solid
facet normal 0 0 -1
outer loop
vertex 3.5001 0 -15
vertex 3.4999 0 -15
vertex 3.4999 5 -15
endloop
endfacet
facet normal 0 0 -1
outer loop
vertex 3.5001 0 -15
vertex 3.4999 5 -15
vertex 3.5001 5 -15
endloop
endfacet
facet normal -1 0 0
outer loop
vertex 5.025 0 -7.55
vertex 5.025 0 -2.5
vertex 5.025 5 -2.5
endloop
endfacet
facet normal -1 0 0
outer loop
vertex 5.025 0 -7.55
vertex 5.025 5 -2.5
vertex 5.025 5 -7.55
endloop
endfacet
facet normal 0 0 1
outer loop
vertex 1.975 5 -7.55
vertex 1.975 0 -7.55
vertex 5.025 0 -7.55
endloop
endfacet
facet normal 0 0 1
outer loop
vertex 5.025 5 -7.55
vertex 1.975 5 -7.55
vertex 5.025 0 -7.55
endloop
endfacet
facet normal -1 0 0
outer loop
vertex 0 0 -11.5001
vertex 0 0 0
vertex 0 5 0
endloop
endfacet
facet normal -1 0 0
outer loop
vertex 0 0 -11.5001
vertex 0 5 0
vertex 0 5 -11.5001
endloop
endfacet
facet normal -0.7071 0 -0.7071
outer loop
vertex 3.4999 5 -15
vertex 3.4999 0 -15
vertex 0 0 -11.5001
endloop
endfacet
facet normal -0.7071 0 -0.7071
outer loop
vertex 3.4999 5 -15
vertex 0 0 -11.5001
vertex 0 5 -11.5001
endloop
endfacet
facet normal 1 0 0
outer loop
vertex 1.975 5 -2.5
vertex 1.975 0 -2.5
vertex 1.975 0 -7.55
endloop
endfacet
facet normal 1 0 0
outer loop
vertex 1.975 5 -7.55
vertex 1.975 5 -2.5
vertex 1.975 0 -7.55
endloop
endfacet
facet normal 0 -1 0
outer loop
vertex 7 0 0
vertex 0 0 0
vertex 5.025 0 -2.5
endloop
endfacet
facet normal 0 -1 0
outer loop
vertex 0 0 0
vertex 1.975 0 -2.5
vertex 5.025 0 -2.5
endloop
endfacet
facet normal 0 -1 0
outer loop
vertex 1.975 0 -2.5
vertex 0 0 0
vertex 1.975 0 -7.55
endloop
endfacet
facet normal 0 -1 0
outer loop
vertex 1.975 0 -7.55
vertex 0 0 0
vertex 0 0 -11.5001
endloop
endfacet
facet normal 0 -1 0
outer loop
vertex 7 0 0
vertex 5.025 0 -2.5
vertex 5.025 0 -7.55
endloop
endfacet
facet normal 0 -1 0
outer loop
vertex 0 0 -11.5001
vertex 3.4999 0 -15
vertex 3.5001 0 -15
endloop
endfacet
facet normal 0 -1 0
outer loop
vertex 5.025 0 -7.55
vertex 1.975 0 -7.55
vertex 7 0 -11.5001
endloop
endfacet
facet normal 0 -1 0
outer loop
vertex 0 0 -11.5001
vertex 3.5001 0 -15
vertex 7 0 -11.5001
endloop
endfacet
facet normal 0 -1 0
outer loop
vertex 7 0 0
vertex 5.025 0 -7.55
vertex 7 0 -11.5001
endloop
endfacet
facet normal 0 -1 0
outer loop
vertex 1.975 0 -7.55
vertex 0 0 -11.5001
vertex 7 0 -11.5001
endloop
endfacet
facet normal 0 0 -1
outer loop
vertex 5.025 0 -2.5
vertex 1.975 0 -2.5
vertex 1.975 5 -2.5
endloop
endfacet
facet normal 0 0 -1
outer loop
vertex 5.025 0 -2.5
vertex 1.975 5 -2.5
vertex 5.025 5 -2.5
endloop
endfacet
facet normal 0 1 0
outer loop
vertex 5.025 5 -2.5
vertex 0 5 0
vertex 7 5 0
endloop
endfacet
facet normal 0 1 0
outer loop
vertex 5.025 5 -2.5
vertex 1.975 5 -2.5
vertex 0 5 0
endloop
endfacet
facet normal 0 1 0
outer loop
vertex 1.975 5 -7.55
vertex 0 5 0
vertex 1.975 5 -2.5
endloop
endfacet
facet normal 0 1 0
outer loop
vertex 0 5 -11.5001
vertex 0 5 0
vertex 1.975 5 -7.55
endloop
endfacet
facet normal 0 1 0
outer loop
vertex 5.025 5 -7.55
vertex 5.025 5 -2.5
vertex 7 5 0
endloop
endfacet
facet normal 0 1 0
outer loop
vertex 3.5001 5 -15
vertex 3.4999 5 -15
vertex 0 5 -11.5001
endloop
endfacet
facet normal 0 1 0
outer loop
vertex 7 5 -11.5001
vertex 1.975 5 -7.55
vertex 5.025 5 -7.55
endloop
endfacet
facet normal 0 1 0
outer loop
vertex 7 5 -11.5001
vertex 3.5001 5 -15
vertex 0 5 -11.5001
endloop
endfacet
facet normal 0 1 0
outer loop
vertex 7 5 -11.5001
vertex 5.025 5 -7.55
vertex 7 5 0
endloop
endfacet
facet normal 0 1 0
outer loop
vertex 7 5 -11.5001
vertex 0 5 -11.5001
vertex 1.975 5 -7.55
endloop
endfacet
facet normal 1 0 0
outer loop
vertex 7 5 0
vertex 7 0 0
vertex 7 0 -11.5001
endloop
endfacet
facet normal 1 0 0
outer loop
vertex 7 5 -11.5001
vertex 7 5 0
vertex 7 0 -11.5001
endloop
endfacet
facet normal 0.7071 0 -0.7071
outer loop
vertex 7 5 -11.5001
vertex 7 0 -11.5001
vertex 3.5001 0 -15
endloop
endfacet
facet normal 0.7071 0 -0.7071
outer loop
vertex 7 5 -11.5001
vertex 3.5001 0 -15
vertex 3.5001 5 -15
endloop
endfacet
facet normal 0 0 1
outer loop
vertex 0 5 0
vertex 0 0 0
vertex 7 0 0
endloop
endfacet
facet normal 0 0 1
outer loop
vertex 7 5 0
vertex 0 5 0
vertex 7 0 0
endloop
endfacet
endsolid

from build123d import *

# Parameters (mm, degrees)
SKETCH2_W           = 7
SKETCH2_H           = 15
SKETCH2_W_2         = 3.05
SKETCH2_H_2         = 5.05
BOSS_EXTRUDE1_DEPTH = 5
CHAMFER1_SIZE       = 3.5


with BuildPart() as part:
    # Sketch2 → Boss-Extrude1 (new body)
    with BuildSketch(Plane(origin=(0, 0, 0), x_dir=(1, 0, 0), z_dir=(0, 1, 0))):
        with Locations((3.5, 7.5)):
            Rectangle(SKETCH2_W, SKETCH2_H)
        with Locations((3.5, 5.025)):
            Rectangle(SKETCH2_W_2, SKETCH2_H_2, mode=Mode.SUBTRACT)
    extrude(amount=BOSS_EXTRUDE1_DEPTH)

    # Chamfer1
    chamfer1_edges = [part.edges().sort_by_distance(p)[0] for p in [
        (0, 2.5, -15),
        (7, 2.5, -15),
    ]]
    chamfer(chamfer1_edges, length=CHAMFER1_SIZE - 0.0001)  # a hair under: the kernel refuses the full size


solid = part.part
